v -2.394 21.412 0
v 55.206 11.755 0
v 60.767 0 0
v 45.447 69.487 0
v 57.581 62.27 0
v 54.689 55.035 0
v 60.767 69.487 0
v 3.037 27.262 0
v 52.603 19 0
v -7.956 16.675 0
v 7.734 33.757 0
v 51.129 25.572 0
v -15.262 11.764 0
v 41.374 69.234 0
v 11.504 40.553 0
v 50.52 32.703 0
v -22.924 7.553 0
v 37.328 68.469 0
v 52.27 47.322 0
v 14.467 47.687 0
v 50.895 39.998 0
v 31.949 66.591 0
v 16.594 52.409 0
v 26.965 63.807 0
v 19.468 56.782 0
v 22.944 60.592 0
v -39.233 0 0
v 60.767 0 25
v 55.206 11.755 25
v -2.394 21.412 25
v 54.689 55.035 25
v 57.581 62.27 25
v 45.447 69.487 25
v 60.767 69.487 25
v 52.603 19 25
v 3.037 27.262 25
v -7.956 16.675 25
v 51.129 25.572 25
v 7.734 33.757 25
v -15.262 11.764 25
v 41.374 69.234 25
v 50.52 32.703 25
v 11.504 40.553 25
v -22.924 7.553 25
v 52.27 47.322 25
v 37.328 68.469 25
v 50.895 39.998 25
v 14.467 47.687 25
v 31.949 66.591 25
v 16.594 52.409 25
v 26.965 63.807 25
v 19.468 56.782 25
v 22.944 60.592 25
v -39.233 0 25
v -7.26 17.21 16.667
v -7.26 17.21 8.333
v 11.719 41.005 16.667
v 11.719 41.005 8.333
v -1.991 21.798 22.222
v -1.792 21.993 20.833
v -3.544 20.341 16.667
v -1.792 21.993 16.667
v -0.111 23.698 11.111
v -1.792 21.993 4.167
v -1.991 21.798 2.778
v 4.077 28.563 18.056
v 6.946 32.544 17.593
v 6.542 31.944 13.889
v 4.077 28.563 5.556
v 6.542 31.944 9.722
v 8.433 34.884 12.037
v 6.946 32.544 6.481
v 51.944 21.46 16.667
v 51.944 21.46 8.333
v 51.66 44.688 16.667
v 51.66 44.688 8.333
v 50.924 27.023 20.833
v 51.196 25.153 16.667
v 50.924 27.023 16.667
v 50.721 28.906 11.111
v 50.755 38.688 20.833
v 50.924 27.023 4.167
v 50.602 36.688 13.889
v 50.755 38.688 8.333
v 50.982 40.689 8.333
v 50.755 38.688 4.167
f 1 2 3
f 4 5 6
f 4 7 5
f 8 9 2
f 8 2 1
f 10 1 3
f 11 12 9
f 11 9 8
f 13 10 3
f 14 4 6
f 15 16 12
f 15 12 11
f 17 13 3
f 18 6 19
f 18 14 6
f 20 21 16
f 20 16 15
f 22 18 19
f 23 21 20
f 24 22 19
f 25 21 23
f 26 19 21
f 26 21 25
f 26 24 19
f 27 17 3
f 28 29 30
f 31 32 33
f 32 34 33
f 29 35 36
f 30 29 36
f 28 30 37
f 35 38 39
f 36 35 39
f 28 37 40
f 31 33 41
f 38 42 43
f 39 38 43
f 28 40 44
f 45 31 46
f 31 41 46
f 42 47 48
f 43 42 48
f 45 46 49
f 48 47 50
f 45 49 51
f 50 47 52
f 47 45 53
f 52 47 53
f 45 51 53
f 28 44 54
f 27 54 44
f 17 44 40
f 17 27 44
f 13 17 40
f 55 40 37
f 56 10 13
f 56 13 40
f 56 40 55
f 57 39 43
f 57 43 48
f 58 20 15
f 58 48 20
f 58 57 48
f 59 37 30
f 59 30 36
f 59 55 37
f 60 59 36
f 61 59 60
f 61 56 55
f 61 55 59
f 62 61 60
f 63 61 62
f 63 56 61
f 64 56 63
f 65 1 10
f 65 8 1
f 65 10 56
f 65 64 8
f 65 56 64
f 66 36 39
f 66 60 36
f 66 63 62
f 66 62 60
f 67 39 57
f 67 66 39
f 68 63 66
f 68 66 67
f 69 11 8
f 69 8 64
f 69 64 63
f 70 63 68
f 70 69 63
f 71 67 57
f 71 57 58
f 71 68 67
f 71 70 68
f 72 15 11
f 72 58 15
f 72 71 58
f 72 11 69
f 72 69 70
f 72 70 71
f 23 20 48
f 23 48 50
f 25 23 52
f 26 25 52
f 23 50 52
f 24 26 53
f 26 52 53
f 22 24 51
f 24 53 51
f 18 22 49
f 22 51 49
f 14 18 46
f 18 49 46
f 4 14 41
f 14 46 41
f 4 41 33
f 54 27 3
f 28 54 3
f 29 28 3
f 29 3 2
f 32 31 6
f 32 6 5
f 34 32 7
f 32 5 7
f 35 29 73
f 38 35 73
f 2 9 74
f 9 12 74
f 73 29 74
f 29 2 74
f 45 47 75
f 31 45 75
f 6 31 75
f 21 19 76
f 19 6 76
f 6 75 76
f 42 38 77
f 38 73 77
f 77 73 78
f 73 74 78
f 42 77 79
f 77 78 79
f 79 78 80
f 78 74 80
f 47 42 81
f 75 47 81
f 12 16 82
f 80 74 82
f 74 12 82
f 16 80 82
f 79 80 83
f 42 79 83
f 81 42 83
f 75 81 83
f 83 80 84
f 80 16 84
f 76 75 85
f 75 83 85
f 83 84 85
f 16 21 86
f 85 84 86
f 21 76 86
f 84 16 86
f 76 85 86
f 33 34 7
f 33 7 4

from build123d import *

# Parameters (mm, degrees)
F1_DEPTH = 25
F2_R     = 32.913540843


with BuildPart() as f1:
    # F0 (on Top) → F1 (new body)
    with BuildSketch(Plane.XY):
        with BuildLine():
            add(Edge.make_bspline(
                [(-39.2333641648, 0), (-27.7979598726, 5.0517939803), (-5.8928164583, 14.728782114), (13.7537860075, 40.0800253408), (18.095766656, 59.7227230679), (20.2540475875, 69.486575876)],
                knots=[0, 0, 0, 0, 0.354553063, 0.6791658164, 1, 1, 1, 1], degree=3))
            Line((-39.2333641648, 0), (60.7666358352, 0))
            add(Edge.make_bspline(
                [(60.7666358352, 0), (57.2575599986, 6.9981081509), (50.237319798, 20.9984895783), (49.931864791, 45.321172526), (57.0784932504, 61.2607026379), (60.7666358352, 69.486575876)],
                knots=[0, 0, 0, 0, 0.3259841606, 0.65216234, 1, 1, 1, 1], degree=3))
            Line((60.7666358352, 69.486575876), (52.7530318439, 69.486575876))
            Line((52.7530318439, 69.486575876), (20.2540475875, 69.486575876))
        make_face()
    extrude(amount=F1_DEPTH)

    # F2
    f2_edges = [f1.edges().sort_by_distance(p)[0] for p in [
        (20.254048, 69.486576, 12.5),
    ]]
    fillet(f2_edges, radius=F2_R)


solid = f1.part
